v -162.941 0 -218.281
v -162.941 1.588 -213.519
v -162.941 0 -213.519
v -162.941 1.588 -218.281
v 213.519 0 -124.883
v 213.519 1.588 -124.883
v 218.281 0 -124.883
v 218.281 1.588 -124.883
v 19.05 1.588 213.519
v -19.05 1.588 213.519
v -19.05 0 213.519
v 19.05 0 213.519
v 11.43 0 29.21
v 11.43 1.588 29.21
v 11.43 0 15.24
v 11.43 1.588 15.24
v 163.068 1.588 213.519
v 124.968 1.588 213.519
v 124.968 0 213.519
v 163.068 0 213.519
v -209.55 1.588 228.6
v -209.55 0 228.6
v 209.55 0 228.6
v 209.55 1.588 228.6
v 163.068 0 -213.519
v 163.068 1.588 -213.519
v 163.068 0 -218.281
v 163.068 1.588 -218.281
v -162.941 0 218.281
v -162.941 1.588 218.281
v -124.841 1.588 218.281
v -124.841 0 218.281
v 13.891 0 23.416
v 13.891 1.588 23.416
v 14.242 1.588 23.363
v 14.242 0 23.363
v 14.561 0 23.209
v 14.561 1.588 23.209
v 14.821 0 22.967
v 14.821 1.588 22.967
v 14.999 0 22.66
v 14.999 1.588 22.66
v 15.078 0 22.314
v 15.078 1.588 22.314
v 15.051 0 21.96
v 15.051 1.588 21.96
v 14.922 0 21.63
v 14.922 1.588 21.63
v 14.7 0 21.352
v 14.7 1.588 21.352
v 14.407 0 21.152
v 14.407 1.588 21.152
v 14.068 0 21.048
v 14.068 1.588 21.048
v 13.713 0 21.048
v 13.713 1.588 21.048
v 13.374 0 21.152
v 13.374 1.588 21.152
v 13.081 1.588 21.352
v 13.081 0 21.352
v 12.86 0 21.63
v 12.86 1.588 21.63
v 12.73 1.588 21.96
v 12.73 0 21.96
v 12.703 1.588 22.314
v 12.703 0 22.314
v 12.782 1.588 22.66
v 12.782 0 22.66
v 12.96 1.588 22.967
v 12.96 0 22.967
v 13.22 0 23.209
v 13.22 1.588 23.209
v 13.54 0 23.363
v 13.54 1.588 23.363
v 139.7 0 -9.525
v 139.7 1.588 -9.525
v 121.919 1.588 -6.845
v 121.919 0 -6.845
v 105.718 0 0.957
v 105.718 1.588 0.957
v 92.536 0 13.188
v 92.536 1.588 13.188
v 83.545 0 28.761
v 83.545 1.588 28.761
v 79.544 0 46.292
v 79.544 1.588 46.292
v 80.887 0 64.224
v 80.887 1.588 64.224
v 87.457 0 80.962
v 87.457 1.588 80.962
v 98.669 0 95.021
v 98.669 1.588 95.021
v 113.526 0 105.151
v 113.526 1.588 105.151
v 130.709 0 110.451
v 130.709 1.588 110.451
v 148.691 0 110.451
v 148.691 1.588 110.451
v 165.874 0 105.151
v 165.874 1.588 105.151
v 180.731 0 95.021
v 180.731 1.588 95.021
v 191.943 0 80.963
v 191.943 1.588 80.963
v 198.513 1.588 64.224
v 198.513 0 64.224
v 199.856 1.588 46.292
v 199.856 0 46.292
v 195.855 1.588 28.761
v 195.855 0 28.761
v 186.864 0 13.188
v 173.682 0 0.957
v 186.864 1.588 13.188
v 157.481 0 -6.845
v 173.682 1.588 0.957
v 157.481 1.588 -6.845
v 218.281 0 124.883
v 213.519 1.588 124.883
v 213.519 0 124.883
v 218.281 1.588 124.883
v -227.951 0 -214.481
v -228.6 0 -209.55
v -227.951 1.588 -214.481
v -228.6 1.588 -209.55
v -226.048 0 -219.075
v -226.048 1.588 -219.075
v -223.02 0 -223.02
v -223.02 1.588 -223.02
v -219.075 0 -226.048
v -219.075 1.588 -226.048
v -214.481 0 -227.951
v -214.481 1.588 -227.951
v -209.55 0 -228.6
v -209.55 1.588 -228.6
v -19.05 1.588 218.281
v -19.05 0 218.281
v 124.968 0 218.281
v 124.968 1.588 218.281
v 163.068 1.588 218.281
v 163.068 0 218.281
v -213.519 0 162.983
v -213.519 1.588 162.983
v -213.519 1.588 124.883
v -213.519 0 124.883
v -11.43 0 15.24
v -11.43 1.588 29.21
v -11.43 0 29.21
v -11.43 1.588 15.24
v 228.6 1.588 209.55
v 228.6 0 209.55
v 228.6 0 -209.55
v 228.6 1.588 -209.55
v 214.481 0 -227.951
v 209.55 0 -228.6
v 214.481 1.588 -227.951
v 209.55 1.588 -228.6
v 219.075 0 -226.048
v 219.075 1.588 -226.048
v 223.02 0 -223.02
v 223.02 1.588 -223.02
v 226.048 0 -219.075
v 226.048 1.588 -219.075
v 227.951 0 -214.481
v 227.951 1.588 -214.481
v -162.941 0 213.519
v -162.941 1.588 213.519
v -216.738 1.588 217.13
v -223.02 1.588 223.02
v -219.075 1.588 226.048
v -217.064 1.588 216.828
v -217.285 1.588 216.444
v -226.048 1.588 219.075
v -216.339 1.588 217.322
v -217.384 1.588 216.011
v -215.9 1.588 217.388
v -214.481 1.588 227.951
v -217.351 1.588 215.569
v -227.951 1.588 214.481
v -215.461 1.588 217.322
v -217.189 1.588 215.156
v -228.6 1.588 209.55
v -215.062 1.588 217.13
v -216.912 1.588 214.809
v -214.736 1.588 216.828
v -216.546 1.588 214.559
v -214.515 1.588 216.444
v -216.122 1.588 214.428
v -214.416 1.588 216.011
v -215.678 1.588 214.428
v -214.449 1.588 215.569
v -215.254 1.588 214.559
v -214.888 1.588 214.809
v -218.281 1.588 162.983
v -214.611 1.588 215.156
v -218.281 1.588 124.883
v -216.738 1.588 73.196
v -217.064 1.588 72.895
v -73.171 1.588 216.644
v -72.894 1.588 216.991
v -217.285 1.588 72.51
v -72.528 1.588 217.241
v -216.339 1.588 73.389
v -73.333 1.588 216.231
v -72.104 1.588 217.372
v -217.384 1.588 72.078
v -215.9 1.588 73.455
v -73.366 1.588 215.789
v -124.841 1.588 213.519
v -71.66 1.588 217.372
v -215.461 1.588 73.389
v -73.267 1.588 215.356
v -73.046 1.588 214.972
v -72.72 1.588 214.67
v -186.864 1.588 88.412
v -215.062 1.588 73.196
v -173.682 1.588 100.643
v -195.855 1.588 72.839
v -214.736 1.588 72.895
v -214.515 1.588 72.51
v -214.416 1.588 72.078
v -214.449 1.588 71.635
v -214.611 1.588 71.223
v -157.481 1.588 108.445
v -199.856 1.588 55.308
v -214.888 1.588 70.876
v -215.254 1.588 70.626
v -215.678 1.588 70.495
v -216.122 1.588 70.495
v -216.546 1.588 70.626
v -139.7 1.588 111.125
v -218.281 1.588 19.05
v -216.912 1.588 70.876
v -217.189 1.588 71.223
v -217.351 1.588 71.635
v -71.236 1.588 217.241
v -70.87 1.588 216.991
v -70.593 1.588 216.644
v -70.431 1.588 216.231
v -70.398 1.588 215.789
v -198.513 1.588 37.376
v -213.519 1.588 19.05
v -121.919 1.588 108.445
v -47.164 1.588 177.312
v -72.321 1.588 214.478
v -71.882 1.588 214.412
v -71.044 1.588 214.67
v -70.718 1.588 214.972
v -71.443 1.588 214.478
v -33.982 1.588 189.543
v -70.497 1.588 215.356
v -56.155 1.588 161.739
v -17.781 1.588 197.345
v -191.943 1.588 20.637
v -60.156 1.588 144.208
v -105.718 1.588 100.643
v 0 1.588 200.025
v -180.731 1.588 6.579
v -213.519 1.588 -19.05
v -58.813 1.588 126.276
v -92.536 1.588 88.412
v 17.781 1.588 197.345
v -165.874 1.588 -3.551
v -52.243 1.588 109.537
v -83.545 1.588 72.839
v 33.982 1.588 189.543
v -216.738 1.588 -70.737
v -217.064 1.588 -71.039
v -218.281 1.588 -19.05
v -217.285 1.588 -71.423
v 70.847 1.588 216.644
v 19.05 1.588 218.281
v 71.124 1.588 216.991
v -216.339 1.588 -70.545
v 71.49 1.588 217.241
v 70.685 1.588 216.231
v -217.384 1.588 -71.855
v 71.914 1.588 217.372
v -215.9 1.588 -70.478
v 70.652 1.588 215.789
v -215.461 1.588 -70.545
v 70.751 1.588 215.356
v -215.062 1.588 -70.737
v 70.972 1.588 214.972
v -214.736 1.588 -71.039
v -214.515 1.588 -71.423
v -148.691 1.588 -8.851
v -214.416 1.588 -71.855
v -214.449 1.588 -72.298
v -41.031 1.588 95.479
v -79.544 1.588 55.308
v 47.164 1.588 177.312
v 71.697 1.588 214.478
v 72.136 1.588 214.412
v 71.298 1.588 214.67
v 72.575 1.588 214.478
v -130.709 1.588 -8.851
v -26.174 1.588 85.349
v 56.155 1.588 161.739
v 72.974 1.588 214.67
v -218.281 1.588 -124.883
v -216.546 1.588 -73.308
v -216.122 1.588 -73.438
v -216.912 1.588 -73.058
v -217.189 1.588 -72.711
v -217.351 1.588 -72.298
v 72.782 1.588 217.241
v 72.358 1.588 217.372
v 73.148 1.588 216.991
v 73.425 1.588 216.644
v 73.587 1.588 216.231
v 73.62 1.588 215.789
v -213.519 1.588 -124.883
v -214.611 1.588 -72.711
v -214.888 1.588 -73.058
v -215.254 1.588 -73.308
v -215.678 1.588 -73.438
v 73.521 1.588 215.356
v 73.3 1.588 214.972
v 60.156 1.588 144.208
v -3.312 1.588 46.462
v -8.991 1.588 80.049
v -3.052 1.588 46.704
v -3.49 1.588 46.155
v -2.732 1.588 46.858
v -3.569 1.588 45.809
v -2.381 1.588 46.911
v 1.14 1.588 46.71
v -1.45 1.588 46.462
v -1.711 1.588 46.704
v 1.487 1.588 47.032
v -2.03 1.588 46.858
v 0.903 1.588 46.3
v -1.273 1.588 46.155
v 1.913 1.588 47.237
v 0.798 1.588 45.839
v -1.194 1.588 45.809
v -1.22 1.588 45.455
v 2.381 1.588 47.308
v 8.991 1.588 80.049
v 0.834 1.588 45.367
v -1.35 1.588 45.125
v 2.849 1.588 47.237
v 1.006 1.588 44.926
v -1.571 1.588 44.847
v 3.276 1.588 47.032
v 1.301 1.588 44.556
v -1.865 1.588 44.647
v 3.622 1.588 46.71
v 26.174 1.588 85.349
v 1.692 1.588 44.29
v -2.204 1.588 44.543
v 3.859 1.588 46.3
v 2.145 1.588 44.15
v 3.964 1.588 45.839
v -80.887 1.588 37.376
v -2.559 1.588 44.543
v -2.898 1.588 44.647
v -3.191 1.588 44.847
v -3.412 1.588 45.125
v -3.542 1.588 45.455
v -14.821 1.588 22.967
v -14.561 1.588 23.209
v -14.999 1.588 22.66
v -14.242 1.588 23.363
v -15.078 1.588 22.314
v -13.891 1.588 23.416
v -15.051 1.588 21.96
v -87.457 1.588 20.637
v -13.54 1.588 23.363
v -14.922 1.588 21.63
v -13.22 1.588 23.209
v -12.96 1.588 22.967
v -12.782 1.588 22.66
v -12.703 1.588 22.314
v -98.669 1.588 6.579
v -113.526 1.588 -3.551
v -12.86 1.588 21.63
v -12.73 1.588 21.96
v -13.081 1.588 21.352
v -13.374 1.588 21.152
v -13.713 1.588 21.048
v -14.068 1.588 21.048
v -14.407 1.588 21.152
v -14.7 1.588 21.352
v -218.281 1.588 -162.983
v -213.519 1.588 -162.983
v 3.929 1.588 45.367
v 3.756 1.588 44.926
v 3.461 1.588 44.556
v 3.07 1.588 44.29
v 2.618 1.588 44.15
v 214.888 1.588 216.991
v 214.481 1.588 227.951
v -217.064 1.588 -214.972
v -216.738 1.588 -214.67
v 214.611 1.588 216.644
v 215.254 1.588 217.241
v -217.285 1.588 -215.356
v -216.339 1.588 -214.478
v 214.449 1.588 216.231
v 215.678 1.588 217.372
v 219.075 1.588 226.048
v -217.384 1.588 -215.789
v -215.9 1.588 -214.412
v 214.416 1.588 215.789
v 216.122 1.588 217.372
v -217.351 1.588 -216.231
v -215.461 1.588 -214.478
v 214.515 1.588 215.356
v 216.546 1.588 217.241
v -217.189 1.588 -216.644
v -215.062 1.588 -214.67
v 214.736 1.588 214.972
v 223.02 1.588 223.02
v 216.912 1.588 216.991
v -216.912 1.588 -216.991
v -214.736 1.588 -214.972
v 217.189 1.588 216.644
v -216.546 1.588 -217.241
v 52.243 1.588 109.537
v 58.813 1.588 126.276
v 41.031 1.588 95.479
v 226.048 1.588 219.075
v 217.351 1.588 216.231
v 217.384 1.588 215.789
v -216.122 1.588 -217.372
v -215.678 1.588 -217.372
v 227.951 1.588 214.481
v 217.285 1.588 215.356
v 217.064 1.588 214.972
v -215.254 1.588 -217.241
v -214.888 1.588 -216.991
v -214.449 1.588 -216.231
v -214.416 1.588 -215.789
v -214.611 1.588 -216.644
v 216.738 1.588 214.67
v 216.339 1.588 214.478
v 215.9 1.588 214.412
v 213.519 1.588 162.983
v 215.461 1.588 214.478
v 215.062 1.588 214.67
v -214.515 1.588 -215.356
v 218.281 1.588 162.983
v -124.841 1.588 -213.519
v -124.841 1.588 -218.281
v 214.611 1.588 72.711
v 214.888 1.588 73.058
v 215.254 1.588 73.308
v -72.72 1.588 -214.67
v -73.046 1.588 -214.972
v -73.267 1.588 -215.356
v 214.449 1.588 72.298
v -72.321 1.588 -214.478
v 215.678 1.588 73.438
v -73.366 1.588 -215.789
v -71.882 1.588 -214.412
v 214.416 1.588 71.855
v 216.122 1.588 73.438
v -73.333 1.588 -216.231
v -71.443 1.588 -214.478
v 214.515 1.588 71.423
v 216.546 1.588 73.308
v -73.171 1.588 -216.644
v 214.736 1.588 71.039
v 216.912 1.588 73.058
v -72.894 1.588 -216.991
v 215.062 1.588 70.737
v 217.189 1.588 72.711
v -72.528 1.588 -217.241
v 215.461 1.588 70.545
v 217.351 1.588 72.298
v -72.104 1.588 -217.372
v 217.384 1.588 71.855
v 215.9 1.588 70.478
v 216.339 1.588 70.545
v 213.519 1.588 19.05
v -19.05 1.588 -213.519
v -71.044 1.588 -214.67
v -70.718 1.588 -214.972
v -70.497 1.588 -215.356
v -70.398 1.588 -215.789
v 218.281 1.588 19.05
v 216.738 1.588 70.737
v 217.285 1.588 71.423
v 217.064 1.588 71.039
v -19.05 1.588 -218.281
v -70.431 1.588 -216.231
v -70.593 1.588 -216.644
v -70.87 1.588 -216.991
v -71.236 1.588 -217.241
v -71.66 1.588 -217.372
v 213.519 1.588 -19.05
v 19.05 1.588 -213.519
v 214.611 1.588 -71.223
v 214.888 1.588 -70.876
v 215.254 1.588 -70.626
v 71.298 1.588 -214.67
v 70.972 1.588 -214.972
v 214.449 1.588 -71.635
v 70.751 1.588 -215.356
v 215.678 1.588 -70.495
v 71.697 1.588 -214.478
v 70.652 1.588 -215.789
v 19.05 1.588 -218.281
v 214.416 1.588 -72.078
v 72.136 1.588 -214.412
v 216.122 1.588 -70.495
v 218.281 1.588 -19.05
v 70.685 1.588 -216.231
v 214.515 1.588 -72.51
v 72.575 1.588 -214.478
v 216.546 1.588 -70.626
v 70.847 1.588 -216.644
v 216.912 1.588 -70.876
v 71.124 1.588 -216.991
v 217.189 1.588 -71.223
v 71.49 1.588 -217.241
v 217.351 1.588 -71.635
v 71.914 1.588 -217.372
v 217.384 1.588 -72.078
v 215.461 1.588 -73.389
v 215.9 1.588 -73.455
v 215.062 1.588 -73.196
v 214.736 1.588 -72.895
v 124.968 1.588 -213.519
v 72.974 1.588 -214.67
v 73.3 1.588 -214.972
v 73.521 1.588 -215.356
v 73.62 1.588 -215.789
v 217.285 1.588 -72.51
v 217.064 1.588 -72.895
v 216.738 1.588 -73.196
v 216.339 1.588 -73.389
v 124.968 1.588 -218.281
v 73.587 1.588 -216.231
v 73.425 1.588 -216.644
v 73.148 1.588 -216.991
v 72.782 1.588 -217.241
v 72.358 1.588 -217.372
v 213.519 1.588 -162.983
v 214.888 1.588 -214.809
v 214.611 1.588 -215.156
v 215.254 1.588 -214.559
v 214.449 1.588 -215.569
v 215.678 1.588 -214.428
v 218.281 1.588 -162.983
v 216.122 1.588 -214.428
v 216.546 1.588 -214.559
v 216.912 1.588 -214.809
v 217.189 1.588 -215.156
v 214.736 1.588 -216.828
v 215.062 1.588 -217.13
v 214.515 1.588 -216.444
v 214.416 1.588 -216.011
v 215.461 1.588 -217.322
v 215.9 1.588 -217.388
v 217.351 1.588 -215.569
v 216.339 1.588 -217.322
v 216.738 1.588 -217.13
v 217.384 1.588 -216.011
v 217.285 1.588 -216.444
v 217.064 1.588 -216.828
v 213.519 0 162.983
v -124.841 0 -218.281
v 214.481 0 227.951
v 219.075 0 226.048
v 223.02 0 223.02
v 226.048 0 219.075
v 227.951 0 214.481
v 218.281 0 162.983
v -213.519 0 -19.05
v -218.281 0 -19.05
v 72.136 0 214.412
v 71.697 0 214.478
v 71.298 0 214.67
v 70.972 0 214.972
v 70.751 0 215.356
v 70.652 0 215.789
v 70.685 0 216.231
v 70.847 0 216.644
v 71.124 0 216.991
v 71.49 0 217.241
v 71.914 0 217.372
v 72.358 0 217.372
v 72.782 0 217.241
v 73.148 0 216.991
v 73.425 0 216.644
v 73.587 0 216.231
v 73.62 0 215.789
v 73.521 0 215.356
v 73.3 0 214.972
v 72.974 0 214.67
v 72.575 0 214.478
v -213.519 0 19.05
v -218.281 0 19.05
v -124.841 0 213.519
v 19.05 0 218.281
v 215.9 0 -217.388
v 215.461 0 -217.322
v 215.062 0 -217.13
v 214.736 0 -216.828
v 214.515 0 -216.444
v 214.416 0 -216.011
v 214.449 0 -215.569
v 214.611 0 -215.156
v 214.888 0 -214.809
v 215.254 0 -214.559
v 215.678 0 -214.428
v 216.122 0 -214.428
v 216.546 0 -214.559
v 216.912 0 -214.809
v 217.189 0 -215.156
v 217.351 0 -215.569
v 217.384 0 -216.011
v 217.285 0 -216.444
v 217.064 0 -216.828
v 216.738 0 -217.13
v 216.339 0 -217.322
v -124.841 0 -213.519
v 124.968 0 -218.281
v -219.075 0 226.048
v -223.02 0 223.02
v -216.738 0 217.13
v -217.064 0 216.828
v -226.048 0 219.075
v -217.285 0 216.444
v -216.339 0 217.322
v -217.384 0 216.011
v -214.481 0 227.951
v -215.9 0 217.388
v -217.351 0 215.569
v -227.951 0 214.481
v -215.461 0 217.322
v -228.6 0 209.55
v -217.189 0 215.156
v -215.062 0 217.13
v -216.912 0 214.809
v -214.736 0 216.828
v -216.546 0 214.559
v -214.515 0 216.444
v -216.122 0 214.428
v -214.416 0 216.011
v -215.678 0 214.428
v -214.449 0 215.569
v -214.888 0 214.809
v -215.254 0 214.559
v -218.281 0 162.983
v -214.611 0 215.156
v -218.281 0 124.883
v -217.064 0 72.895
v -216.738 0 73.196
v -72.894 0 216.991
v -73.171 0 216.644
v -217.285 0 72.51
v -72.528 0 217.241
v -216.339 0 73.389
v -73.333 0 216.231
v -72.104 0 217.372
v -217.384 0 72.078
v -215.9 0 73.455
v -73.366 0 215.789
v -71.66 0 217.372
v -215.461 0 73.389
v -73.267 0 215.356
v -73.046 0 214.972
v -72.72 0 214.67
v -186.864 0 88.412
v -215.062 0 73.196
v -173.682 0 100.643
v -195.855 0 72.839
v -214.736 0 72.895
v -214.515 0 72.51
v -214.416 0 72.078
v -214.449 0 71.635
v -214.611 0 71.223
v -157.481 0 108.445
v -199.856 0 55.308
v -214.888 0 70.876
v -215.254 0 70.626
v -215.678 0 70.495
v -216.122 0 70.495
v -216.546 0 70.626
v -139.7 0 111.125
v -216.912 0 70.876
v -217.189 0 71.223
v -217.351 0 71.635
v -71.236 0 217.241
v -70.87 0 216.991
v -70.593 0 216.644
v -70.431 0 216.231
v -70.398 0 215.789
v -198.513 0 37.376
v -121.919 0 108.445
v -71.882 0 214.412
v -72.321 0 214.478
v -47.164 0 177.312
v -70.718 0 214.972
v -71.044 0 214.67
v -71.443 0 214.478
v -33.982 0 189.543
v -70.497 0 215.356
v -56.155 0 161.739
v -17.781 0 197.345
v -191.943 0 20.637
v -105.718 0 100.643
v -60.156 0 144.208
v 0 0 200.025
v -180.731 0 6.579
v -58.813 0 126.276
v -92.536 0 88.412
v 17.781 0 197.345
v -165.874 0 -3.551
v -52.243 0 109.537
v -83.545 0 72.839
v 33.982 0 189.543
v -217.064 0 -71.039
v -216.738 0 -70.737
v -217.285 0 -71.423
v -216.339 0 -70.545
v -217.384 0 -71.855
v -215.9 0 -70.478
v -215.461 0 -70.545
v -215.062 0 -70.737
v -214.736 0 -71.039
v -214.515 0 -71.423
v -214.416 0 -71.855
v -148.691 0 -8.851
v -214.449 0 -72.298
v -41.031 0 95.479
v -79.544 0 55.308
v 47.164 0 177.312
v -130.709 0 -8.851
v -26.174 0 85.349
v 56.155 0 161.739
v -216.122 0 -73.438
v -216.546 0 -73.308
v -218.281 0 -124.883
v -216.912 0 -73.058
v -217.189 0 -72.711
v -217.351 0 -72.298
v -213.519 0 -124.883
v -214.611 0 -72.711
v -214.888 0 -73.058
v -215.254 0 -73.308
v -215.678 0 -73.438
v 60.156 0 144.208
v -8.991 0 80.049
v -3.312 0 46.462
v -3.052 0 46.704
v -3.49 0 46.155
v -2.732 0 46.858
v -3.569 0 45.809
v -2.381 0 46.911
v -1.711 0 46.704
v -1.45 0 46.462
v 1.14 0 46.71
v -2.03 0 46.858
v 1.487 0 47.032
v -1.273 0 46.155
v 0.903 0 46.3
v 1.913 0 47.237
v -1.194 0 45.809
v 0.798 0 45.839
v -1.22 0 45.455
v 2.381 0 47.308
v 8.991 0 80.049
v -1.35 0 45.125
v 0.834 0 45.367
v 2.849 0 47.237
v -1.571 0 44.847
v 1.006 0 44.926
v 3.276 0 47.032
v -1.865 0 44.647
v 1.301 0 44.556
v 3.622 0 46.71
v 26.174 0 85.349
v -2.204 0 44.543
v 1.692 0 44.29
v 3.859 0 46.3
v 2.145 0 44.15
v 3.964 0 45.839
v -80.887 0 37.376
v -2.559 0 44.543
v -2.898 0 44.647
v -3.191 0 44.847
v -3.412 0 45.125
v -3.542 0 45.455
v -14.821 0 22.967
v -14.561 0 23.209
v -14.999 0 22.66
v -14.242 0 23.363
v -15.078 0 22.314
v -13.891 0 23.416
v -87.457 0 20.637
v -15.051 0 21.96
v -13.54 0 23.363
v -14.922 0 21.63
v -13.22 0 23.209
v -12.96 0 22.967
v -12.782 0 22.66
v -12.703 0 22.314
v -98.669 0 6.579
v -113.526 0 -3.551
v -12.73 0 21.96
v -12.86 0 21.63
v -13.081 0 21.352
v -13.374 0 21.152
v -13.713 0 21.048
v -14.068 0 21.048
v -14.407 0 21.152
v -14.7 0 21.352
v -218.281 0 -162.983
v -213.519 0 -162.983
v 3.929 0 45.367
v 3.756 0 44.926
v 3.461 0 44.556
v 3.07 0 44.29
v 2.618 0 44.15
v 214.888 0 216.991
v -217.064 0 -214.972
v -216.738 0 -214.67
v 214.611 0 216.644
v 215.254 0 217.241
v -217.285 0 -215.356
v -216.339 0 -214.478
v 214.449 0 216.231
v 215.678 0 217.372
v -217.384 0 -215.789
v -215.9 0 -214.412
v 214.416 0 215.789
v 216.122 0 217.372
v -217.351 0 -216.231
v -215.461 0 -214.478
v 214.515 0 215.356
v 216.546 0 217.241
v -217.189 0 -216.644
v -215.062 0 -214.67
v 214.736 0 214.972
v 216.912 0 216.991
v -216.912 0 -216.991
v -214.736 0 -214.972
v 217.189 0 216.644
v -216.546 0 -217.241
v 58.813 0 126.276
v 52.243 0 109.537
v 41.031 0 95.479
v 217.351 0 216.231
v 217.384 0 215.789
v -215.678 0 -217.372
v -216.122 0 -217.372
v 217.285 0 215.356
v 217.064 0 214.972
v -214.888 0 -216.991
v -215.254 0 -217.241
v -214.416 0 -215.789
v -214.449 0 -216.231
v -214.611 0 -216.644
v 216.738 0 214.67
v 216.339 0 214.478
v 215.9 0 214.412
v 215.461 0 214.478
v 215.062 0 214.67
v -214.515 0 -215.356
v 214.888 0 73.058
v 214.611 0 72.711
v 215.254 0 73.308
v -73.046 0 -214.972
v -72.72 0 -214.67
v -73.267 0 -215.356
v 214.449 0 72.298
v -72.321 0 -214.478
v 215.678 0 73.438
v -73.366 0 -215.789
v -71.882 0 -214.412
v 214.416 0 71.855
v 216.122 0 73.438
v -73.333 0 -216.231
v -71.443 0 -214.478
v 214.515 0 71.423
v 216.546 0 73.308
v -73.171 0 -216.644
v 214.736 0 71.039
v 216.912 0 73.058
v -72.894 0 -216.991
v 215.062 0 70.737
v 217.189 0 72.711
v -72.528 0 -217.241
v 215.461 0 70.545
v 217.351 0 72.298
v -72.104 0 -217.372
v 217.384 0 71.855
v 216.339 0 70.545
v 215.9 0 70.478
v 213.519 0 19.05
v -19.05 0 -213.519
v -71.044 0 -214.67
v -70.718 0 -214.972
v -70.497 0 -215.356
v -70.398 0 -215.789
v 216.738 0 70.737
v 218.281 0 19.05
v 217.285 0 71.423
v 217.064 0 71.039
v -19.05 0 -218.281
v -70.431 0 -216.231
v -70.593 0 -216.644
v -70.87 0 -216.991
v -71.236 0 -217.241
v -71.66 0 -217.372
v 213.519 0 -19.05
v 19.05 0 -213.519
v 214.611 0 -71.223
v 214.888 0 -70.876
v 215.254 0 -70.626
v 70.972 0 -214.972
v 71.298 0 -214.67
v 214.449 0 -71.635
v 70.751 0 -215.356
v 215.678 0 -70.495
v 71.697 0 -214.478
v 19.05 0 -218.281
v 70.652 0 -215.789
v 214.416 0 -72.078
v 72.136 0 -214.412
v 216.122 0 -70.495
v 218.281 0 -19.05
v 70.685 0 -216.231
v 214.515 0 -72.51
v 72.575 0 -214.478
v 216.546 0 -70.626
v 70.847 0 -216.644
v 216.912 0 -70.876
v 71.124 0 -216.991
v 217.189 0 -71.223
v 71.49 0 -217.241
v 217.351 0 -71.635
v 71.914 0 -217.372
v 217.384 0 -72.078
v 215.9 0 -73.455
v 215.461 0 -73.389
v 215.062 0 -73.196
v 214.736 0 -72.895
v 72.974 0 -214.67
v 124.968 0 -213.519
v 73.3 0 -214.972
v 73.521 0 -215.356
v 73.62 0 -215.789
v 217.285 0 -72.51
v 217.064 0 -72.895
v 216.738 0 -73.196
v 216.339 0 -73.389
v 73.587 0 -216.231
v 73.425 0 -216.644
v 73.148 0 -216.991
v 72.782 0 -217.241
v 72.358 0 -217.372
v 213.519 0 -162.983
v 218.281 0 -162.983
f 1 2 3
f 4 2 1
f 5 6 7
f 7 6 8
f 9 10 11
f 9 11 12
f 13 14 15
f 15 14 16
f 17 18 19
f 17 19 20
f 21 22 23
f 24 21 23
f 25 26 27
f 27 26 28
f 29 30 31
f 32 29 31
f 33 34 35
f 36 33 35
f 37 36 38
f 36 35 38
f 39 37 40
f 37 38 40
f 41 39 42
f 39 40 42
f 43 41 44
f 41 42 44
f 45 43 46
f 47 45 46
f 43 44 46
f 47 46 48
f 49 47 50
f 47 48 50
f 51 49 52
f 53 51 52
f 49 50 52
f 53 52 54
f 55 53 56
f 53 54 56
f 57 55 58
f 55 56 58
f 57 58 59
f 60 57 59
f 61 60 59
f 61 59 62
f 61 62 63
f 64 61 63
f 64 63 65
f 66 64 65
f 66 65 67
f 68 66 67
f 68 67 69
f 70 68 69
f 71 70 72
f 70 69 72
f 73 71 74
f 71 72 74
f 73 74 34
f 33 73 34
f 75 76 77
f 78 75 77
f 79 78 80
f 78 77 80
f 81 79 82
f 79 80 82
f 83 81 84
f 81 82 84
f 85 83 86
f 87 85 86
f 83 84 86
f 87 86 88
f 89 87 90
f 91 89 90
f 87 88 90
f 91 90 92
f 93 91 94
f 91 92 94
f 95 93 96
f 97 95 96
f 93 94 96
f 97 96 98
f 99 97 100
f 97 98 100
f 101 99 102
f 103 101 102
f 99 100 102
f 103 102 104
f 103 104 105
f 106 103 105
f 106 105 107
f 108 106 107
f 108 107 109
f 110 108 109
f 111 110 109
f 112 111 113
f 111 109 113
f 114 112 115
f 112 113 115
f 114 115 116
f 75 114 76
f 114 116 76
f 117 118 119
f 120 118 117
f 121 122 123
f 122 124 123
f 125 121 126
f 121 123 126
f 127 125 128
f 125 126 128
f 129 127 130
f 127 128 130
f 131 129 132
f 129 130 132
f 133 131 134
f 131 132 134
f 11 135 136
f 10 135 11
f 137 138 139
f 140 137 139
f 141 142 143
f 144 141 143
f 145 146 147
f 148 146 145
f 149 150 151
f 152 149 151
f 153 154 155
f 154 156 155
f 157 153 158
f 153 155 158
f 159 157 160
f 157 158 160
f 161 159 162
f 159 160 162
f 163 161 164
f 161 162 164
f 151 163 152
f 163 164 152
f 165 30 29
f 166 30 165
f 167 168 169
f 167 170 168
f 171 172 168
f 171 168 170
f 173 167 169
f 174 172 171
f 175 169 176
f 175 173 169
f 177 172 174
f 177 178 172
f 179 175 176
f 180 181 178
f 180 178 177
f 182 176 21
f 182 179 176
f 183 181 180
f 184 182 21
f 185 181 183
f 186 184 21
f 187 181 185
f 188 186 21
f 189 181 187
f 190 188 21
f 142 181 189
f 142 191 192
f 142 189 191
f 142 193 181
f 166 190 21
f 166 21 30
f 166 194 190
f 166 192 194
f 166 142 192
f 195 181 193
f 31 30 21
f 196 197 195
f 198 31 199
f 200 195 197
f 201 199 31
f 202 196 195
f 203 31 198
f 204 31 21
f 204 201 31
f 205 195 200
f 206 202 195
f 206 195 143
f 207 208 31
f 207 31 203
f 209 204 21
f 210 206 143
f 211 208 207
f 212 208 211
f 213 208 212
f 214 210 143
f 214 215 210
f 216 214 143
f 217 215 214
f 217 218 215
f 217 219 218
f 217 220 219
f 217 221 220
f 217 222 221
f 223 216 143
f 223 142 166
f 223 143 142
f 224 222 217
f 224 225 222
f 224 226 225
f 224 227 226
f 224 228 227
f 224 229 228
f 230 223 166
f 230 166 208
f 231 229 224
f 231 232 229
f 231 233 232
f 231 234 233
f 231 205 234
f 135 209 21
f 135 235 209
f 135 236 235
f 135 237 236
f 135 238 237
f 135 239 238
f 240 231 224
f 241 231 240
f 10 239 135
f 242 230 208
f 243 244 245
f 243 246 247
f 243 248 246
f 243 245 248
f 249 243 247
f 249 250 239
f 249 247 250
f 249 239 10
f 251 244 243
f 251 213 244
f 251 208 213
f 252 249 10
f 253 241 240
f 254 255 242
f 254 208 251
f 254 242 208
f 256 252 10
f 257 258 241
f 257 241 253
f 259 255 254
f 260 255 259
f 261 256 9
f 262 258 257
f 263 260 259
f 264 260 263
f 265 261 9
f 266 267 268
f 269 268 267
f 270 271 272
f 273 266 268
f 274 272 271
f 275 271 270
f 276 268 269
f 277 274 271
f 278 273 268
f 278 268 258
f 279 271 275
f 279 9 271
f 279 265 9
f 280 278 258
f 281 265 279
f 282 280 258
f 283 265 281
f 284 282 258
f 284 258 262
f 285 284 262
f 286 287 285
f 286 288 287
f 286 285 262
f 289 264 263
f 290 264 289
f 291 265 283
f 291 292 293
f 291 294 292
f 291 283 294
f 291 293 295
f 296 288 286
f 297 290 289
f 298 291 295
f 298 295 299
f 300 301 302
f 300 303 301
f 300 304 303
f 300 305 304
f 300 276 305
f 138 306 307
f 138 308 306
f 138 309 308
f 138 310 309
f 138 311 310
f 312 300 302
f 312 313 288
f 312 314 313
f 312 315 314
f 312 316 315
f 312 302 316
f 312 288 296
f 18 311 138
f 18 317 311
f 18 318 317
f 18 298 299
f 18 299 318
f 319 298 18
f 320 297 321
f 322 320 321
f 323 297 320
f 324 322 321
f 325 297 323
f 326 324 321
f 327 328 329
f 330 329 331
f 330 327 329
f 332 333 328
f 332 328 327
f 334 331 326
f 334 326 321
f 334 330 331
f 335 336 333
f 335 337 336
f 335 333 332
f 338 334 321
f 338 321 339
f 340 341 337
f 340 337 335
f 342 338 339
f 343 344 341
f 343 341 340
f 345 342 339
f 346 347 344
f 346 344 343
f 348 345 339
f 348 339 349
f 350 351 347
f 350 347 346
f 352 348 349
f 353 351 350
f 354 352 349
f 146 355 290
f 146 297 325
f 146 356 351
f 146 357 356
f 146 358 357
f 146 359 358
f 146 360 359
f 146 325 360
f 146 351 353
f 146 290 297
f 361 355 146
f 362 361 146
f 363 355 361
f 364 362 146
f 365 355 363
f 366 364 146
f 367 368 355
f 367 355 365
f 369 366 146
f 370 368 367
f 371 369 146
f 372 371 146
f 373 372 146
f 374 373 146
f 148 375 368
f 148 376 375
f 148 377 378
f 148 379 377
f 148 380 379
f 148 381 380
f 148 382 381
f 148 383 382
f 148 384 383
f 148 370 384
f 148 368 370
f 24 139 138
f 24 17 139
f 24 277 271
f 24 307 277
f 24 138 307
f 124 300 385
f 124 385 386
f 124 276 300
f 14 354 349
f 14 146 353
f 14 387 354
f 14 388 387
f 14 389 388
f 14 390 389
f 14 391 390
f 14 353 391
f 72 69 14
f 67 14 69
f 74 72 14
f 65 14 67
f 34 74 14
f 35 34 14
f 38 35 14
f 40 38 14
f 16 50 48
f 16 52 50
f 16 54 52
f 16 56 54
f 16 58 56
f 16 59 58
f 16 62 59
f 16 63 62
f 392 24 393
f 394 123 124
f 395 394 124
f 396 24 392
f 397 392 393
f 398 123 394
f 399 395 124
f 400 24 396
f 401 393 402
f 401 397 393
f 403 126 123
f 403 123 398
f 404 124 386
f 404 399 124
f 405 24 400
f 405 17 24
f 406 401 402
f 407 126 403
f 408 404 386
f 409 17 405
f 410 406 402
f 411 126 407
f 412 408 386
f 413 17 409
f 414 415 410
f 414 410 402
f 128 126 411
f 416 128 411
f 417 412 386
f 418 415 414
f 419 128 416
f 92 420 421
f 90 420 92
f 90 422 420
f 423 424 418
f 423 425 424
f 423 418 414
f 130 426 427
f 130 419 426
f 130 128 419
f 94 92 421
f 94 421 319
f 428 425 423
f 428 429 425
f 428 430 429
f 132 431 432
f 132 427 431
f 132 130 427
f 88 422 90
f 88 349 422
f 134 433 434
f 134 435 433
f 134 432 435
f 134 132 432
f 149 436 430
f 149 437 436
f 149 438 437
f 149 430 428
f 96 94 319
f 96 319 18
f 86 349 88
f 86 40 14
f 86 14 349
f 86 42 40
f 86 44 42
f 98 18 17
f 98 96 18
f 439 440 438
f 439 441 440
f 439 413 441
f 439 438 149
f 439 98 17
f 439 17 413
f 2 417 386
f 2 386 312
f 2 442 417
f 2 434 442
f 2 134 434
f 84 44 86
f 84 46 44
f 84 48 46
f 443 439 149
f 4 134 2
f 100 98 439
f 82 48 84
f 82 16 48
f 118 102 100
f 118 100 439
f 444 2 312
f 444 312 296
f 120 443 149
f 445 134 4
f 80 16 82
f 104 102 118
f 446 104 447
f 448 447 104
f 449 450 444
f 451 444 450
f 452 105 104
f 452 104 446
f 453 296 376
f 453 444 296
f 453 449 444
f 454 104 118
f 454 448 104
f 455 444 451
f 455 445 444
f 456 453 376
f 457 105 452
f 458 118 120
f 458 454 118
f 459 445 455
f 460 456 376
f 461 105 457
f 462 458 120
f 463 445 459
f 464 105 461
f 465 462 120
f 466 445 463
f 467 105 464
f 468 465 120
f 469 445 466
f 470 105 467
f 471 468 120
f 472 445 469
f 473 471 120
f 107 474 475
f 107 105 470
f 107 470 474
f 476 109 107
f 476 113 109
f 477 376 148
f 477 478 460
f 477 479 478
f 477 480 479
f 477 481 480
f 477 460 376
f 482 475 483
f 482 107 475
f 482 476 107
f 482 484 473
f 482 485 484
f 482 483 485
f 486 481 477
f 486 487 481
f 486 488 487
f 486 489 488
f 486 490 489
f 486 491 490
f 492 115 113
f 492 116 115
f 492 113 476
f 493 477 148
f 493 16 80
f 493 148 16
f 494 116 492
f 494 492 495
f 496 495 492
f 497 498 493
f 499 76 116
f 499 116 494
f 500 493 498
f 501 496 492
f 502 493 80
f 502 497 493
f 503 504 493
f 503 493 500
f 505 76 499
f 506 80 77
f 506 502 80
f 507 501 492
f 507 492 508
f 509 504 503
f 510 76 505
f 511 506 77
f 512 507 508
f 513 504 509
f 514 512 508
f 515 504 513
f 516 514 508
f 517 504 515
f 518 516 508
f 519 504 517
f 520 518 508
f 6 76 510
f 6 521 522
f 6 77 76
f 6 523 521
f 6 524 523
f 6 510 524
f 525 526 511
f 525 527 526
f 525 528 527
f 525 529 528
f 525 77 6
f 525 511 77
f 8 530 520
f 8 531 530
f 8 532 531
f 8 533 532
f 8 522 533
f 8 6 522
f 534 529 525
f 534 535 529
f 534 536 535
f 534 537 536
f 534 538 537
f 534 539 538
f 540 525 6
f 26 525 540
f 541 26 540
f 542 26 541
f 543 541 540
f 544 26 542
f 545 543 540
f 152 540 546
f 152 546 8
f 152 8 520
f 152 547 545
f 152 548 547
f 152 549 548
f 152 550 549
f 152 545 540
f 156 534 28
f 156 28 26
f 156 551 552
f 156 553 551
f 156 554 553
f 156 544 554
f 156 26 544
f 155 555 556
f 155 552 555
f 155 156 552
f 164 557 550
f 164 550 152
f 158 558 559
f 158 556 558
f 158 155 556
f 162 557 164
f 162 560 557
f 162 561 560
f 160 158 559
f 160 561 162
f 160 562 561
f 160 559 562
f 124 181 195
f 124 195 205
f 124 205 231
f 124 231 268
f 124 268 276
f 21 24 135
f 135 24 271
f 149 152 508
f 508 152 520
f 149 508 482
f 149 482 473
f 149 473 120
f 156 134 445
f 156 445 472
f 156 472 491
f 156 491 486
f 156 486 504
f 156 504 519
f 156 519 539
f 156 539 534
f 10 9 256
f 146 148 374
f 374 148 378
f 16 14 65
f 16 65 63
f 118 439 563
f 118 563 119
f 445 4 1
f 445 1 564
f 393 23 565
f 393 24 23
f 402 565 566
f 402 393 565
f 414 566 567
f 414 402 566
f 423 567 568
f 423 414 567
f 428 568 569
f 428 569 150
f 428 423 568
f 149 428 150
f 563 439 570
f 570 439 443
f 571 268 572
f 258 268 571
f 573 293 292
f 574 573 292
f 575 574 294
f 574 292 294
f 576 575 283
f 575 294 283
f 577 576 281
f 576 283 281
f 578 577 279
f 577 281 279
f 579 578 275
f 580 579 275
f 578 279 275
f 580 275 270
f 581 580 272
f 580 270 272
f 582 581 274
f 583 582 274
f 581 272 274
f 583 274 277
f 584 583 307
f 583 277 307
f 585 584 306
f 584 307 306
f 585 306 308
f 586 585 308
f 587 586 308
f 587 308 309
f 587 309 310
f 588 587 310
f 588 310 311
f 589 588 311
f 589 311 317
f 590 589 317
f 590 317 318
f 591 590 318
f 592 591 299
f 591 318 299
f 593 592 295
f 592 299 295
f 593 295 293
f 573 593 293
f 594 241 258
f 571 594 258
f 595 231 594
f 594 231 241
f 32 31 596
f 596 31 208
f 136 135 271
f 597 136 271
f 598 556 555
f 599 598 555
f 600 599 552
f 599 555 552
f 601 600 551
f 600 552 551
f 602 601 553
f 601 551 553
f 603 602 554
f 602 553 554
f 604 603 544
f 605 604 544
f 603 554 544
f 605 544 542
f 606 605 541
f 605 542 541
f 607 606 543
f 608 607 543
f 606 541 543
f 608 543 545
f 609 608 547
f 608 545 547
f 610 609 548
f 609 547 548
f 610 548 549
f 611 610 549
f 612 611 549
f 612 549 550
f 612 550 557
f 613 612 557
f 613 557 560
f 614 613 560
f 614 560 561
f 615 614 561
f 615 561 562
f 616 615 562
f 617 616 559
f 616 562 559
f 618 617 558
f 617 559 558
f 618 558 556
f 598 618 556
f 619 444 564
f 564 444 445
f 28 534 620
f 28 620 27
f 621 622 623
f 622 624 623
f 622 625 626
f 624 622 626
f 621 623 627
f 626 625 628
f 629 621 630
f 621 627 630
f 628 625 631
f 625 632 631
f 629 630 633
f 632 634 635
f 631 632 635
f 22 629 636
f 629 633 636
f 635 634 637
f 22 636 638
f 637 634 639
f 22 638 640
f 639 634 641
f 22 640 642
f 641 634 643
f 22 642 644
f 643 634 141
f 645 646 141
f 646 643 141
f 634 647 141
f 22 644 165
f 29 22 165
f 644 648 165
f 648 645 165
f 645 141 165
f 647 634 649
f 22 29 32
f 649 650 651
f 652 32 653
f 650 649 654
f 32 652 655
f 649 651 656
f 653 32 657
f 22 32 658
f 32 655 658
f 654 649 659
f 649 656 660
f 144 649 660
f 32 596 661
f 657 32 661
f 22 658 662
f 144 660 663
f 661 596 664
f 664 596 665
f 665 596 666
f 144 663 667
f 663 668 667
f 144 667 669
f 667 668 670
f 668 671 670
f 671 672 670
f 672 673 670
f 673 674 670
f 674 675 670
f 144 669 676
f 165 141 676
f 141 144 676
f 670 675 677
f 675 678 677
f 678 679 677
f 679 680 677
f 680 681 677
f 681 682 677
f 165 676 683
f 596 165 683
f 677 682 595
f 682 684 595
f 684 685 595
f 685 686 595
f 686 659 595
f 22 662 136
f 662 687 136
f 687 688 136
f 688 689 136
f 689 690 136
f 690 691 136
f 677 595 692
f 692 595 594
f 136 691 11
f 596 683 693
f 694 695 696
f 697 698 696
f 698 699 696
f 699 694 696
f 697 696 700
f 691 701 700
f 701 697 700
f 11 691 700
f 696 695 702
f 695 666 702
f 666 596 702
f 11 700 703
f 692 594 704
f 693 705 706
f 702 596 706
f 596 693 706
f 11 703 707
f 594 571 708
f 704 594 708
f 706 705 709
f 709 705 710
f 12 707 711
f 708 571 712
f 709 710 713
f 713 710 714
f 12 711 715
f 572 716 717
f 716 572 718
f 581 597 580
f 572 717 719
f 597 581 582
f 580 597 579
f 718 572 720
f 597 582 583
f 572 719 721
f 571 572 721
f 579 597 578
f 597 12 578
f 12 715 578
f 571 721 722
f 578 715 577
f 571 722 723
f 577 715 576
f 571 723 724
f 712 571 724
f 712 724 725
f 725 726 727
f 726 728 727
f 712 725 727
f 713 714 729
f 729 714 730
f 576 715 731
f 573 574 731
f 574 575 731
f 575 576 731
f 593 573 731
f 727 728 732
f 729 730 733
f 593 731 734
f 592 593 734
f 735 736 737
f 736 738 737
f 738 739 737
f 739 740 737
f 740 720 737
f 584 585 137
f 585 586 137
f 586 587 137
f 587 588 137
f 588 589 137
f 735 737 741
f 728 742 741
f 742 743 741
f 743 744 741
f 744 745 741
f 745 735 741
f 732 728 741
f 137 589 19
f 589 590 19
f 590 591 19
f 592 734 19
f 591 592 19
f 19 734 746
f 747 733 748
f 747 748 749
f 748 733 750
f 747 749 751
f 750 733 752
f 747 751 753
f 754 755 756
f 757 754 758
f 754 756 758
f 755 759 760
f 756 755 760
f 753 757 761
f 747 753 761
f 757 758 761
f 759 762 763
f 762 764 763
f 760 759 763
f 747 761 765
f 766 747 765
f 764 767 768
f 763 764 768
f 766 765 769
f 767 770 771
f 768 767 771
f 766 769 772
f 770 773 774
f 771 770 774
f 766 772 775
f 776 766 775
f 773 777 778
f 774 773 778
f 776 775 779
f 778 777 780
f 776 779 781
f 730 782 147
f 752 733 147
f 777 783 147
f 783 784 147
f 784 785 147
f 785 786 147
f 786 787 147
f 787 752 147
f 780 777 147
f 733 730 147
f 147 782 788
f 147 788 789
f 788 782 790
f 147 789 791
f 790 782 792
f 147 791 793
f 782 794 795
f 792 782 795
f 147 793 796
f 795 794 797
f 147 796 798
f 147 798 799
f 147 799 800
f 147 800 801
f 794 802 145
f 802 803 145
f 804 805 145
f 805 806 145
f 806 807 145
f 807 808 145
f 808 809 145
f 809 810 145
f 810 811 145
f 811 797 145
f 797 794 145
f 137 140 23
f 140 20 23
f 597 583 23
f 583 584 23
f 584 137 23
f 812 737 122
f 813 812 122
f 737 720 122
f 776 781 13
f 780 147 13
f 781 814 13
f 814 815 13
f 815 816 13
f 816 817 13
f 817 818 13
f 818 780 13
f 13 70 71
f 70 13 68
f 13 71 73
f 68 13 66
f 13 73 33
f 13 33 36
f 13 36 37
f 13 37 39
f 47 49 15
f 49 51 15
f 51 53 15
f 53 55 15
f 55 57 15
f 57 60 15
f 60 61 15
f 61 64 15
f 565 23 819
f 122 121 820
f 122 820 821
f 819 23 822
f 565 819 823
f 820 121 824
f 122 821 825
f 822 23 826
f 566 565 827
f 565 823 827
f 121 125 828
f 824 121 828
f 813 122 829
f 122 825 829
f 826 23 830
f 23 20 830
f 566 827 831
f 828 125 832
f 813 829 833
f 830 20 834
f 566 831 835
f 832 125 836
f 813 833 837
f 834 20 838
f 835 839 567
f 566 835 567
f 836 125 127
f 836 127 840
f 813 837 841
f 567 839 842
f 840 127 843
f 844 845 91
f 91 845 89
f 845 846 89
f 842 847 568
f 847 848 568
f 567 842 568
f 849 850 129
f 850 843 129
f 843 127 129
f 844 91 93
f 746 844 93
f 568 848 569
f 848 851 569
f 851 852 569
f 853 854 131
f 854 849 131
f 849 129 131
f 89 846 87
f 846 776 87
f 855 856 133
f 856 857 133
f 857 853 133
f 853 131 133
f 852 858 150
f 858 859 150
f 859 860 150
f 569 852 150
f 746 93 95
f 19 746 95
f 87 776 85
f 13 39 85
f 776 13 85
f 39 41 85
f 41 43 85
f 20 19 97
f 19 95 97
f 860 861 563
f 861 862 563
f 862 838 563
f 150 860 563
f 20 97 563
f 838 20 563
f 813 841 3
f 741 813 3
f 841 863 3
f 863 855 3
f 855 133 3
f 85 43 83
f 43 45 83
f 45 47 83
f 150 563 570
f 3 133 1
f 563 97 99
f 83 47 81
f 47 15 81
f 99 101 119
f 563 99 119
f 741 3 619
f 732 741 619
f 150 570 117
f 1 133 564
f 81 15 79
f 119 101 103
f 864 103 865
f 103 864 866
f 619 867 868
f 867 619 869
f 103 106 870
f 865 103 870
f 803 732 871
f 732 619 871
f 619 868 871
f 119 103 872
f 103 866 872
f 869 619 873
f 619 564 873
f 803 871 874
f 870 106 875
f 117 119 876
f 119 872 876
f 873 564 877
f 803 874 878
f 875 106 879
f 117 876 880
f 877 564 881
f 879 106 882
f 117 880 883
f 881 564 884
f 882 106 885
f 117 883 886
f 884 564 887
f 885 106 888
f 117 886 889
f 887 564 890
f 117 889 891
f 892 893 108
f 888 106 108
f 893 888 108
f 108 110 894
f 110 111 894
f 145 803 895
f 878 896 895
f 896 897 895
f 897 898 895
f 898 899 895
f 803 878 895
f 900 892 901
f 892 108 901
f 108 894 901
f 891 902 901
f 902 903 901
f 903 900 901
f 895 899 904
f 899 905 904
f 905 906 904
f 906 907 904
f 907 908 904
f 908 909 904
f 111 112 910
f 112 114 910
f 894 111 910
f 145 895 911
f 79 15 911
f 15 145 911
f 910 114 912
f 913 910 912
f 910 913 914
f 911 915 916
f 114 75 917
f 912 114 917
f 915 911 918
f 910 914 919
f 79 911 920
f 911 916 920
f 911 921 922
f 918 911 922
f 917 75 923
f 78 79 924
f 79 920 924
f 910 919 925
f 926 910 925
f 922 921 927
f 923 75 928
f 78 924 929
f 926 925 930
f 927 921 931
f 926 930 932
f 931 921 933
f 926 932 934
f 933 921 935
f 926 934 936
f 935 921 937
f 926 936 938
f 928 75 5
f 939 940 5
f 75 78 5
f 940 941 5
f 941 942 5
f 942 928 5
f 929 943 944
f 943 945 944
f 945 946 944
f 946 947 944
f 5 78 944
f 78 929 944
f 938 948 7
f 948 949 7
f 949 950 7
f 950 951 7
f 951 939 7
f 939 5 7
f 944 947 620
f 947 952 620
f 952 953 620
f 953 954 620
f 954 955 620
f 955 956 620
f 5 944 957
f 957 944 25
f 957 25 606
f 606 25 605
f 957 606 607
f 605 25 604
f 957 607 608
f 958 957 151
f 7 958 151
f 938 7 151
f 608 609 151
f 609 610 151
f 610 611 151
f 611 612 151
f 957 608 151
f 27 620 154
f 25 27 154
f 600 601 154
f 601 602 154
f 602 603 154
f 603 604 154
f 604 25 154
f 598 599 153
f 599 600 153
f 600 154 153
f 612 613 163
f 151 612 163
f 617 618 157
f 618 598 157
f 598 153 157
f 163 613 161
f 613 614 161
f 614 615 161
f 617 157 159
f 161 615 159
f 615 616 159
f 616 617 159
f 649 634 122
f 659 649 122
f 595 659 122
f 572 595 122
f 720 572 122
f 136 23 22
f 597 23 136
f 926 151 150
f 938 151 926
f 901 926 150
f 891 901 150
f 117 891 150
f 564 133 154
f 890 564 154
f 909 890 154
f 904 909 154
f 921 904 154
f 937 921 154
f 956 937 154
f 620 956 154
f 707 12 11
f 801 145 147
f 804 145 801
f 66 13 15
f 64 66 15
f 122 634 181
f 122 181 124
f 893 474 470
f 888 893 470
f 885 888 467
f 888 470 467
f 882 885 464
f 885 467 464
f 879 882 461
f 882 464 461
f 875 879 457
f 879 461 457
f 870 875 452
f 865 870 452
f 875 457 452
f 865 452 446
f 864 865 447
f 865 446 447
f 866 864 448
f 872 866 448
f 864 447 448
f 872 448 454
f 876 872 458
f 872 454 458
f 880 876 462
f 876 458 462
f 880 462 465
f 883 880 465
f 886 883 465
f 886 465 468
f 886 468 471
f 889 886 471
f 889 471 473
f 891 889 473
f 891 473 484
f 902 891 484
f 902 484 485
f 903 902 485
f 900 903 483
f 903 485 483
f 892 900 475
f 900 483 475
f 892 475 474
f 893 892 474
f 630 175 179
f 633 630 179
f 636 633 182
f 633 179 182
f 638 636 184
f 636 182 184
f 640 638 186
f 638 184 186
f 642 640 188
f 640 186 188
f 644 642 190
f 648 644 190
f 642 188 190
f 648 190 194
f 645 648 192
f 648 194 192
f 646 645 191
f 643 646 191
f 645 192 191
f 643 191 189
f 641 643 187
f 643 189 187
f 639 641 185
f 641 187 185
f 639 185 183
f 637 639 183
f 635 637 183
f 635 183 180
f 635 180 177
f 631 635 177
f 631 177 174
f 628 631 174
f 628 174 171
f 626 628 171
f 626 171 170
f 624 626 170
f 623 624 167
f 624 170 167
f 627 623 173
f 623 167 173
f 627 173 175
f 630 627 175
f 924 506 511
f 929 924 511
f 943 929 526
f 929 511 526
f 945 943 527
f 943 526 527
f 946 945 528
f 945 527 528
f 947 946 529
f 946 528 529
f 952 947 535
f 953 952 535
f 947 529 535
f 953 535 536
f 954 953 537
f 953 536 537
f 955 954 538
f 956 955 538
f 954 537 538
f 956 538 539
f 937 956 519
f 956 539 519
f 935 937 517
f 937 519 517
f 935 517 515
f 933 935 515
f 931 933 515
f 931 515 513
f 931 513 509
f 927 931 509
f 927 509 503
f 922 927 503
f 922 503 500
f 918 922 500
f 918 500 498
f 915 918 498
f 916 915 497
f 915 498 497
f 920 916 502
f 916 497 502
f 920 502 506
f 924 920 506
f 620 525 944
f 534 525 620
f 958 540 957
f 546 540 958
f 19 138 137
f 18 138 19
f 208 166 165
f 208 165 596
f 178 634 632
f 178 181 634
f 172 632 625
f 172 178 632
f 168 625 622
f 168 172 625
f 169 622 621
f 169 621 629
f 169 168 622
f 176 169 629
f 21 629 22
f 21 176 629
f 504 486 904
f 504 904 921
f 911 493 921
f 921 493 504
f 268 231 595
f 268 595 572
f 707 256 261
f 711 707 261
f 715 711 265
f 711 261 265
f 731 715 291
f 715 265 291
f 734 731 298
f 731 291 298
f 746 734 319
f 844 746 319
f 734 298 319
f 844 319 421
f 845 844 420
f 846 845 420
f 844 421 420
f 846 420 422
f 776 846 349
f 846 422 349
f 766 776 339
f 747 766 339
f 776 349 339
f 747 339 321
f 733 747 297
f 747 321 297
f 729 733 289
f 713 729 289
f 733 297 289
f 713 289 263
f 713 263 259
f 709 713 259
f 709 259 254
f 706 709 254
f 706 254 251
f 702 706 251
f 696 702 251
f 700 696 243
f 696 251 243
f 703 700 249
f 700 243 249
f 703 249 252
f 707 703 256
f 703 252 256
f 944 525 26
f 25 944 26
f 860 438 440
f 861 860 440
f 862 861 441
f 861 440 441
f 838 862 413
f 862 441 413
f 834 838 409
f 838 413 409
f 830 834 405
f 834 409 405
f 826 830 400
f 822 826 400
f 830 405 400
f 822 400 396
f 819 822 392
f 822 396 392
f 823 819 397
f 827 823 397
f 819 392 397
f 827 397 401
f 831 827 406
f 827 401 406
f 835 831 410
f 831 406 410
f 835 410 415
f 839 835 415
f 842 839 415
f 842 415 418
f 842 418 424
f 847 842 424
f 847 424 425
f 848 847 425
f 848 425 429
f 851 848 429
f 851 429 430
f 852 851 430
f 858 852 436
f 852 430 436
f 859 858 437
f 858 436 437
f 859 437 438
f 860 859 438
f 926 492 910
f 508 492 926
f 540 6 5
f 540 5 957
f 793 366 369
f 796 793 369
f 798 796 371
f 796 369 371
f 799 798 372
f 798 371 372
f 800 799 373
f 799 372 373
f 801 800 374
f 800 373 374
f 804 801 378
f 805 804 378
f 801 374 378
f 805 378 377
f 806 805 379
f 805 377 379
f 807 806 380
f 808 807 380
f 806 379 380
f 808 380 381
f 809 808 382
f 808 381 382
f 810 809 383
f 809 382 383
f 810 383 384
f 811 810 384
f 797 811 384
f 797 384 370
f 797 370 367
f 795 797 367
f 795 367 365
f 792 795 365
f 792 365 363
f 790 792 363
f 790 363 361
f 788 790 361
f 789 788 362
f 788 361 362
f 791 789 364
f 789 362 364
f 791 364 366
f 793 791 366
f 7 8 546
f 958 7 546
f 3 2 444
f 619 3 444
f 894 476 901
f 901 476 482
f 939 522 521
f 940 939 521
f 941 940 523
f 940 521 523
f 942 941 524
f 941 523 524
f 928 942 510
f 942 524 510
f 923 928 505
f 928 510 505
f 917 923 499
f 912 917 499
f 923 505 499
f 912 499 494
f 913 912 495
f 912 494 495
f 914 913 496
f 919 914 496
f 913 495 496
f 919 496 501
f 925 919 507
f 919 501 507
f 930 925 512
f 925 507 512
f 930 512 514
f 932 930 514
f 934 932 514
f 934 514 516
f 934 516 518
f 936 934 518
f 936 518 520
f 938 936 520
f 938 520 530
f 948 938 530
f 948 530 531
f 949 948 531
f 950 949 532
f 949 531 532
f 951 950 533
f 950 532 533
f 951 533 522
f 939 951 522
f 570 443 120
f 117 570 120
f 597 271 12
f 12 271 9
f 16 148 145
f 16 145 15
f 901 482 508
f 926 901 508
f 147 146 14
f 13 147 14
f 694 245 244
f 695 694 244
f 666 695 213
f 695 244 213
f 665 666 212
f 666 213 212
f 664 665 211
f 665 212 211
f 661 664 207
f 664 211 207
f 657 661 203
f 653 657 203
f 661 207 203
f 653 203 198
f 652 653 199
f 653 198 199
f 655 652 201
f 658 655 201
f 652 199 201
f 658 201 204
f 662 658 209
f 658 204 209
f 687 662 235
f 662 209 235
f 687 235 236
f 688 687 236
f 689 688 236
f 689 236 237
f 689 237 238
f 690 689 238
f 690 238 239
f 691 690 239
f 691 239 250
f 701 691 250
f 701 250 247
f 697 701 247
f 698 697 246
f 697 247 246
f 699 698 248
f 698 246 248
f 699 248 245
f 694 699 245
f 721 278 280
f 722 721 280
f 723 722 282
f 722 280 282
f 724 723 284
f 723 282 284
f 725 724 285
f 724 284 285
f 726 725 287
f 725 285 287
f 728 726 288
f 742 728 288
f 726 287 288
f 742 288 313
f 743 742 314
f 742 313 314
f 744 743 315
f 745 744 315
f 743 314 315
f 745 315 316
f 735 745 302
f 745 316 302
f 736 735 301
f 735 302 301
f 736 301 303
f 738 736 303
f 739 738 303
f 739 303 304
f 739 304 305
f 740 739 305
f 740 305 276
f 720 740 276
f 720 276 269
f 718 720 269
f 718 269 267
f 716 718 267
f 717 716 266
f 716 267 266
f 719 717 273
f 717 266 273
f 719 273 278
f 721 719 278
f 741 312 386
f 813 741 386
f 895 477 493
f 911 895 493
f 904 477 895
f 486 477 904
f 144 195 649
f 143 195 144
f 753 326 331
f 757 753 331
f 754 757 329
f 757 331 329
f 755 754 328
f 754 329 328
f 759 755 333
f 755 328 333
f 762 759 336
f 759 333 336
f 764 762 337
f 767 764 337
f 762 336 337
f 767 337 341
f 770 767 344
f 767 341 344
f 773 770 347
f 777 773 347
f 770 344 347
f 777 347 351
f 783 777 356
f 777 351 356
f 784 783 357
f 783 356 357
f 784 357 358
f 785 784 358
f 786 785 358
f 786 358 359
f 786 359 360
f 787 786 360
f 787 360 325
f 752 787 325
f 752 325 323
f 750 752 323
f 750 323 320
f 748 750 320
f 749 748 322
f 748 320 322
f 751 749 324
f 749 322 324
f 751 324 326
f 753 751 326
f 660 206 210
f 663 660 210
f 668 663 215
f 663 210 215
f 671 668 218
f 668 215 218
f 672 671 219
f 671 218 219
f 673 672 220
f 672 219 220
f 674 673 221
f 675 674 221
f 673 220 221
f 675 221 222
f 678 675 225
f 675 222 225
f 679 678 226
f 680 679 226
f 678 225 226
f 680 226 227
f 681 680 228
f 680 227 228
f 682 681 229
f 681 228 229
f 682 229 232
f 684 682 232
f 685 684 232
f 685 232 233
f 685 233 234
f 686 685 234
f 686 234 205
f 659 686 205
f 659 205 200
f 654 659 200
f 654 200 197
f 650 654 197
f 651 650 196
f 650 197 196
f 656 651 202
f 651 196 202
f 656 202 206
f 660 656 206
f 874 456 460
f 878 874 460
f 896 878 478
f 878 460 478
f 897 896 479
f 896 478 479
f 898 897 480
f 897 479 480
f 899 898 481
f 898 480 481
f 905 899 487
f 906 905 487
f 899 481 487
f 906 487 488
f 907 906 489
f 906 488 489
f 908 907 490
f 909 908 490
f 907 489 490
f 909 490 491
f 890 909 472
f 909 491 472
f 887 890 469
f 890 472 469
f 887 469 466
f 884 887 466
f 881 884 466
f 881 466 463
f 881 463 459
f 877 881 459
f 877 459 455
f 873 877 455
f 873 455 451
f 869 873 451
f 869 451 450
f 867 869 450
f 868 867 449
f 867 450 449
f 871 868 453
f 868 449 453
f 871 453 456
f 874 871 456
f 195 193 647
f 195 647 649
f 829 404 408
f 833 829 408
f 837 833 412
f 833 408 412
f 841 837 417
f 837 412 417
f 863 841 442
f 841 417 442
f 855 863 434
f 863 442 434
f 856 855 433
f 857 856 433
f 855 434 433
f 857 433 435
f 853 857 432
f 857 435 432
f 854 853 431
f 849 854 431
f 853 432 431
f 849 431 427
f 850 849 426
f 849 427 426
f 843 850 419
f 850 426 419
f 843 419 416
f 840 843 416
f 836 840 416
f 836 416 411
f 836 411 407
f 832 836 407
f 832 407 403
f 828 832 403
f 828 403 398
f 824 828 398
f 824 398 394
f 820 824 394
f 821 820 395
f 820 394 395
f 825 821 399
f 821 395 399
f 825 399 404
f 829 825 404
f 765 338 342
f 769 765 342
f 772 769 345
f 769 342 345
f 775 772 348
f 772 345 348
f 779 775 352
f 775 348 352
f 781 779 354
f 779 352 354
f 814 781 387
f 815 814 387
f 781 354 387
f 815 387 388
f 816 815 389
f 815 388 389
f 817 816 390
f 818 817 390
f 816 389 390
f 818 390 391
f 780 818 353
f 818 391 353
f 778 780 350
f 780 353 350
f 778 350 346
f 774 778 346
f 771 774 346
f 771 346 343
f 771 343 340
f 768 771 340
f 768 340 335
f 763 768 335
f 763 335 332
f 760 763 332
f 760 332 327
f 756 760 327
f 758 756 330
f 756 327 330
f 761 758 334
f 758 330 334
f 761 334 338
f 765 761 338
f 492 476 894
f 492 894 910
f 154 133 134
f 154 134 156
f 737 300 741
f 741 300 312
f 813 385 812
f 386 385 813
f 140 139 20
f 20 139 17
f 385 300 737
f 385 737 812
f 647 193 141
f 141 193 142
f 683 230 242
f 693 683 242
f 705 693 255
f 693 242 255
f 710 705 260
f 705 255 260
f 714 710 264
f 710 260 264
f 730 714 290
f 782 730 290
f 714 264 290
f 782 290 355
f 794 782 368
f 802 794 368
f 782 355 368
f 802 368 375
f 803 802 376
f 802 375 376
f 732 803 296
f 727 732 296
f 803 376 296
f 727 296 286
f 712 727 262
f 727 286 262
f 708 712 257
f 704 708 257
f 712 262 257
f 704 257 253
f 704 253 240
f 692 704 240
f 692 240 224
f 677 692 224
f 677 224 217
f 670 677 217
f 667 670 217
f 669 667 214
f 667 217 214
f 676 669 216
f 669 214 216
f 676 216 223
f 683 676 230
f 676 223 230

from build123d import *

# Parameters (mm, degrees)
SKETCH1_W             = 457.2
SKETCH1_H             = 457.2
MAIN_PLATE_DEPTH      = 1.5875
SKETCH2_R             = 60.325
DRUM_HOLES_DEPTH      = 1.5875
SKETCH4_R             = 1.190625
SKETCH4_R_2           = 1.5875
IR_HOLES_DEPTH        = 1.5875
SKETCH5_R             = 1.48828125
BOLT_HOLES_DEPTH      = 1.5875
SKETCH7_R             = 1.190625
SKETCH7_W             = 22.86
SKETCH7_H             = 13.97
SERVO_DEPTH           = 1.5875
SKETCH8_W             = 4.7625
SKETCH8_H             = 38.1
SKETCH8_W_2           = 38.1
SKETCH8_H_2           = 4.7625
ALIGNMENT_HOLES_DEPTH = 1.5875
FILLET1_R             = 19.05


with BuildPart() as part:
    # Sketch1 → Main Plate (new body)
    with BuildSketch(Plane(origin=(0, 0, 0), x_dir=(1, 0, 0), z_dir=(0, 1, 0))):
        Rectangle(SKETCH1_W, SKETCH1_H)
    extrude(amount=MAIN_PLATE_DEPTH)

    # Sketch2 → Drum Holes (cut)
    with BuildSketch(Plane(origin=(0, 1.5875, 0), x_dir=(1, 0, 0), z_dir=(0, 1, 0))):
        with Locations(Location((0, -139.7, 0), (0, 0, 270))):
            Circle(SKETCH2_R)
        with Locations(Location((-139.7, -50.8, 0), (0, 0, 270))):
            Circle(SKETCH2_R)
        with Locations(Location((139.7, -50.8, 0), (0, 0, 90))):
            Circle(SKETCH2_R)
    extrude(amount=-DRUM_HOLES_DEPTH, mode=Mode.SUBTRACT)

    # Sketch4 → IR Holes (cut)
    with BuildSketch(Plane(origin=(0, 1.5875, 0), x_dir=(1, 0, 0), z_dir=(0, 1, 0))):
        with Locations(Location((-2.38125, -45.72, 0), (0, 0, 270))):
            Circle(SKETCH4_R)
        with Locations(Location((2.38125, -45.72, 0), (0, 0, 270))):
            Circle(SKETCH4_R_2)
    extrude(amount=-IR_HOLES_DEPTH, mode=Mode.SUBTRACT)

    # Sketch5 → Bolt Holes (cut)
    with BuildSketch(Plane(origin=(0, 1.5875, 0), x_dir=(1, 0, 0), z_dir=(0, 1, 0))):
        with Locations(Location((-215.9, 215.9, 0), (0, 0, 270))):
            Circle(SKETCH5_R)
        with Locations(Location((-215.9, 71.966666667, 0), (0, 0, 270))):
            Circle(SKETCH5_R)
        with Locations(Location((-215.9, -71.966666667, 0), (0, 0, 270))):
            Circle(SKETCH5_R)
        with Locations(Location((-215.9, -215.9, 0), (0, 0, 270))):
            Circle(SKETCH5_R)
        with Locations(Location((-71.882, 215.9, 0), (0, 0, 270))):
            Circle(SKETCH5_R)
        with Locations(Location((72.136, 215.9, 0), (0, 0, 270))):
            Circle(SKETCH5_R)
        with Locations(Location((215.9, 215.9, 0), (0, 0, 90))):
            Circle(SKETCH5_R)
        with Locations(Location((215.9, 71.966666667, 0), (0, 0, 90))):
            Circle(SKETCH5_R)
        with Locations(Location((215.9, -71.966666667, 0), (0, 0, 90))):
            Circle(SKETCH5_R)
        with Locations(Location((215.9, -215.9, 0), (0, 0, 90))):
            Circle(SKETCH5_R)
        with Locations(Location((72.136, -215.9, 0), (0, 0, 90))):
            Circle(SKETCH5_R)
        with Locations(Location((-71.882, -215.9, 0), (0, 0, 90))):
            Circle(SKETCH5_R)
    extrude(amount=-BOLT_HOLES_DEPTH, mode=Mode.SUBTRACT)

    # Sketch7 → Servo (cut)
    with BuildSketch(Plane(origin=(0, 1.5875, 0), x_dir=(1, 0, 0), z_dir=(0, 1, 0))):
        with Locations(Location((-13.890625, -22.225, 0), (0, 0, 270))):
            Circle(SKETCH7_R)
        with Locations(Location((13.890625, -22.225, 0), (0, 0, 270))):
            Circle(SKETCH7_R)
        with Locations((0, -22.225)):
            Rectangle(SKETCH7_W, SKETCH7_H)
    extrude(amount=-SERVO_DEPTH, mode=Mode.SUBTRACT)

    # Sketch8 → Alignment Holes (cut)
    with BuildSketch(Plane(origin=(0, 1.5875, 0), x_dir=(1, 0, 0), z_dir=(0, 1, 0))):
        with Locations((-215.9, -143.933333333)):
            Rectangle(SKETCH8_W, SKETCH8_H)
        with Locations((-215.9, 0)):
            Rectangle(SKETCH8_W, SKETCH8_H)
        with Locations((215.9, -143.933333333)):
            Rectangle(SKETCH8_W, SKETCH8_H)
        with Locations((-215.9, 143.933333333)):
            Rectangle(SKETCH8_W, SKETCH8_H)
        with Locations((215.9, 0)):
            Rectangle(SKETCH8_W, SKETCH8_H)
        with Locations((215.9, 143.933333333)):
            Rectangle(SKETCH8_W, SKETCH8_H)
        with Locations((-143.891, 215.9)):
            Rectangle(SKETCH8_W_2, SKETCH8_H_2)
        with Locations((144.018, 215.9)):
            Rectangle(SKETCH8_W_2, SKETCH8_H_2)
        with Locations((0, 215.9)):
            Rectangle(SKETCH8_W_2, SKETCH8_H_2)
        with Locations((144.018, -215.9)):
            Rectangle(SKETCH8_W_2, SKETCH8_H_2)
        with Locations((0, -215.9)):
            Rectangle(SKETCH8_W_2, SKETCH8_H_2)
        with Locations((-143.891, -215.9)):
            Rectangle(SKETCH8_W_2, SKETCH8_H_2)
    extrude(amount=-ALIGNMENT_HOLES_DEPTH, mode=Mode.SUBTRACT)

    # Fillet1
    fillet1_edges = [part.edges().sort_by_distance(p)[0] for p in [
        (228.6, 0.79375, 228.6),
        (-228.6, 0.79375, 228.6),
        (-228.6, 0.79375, -228.6),
        (228.6, 0.79375, -228.6),
    ]]
    fillet(fillet1_edges, radius=FILLET1_R)


solid = part.part
